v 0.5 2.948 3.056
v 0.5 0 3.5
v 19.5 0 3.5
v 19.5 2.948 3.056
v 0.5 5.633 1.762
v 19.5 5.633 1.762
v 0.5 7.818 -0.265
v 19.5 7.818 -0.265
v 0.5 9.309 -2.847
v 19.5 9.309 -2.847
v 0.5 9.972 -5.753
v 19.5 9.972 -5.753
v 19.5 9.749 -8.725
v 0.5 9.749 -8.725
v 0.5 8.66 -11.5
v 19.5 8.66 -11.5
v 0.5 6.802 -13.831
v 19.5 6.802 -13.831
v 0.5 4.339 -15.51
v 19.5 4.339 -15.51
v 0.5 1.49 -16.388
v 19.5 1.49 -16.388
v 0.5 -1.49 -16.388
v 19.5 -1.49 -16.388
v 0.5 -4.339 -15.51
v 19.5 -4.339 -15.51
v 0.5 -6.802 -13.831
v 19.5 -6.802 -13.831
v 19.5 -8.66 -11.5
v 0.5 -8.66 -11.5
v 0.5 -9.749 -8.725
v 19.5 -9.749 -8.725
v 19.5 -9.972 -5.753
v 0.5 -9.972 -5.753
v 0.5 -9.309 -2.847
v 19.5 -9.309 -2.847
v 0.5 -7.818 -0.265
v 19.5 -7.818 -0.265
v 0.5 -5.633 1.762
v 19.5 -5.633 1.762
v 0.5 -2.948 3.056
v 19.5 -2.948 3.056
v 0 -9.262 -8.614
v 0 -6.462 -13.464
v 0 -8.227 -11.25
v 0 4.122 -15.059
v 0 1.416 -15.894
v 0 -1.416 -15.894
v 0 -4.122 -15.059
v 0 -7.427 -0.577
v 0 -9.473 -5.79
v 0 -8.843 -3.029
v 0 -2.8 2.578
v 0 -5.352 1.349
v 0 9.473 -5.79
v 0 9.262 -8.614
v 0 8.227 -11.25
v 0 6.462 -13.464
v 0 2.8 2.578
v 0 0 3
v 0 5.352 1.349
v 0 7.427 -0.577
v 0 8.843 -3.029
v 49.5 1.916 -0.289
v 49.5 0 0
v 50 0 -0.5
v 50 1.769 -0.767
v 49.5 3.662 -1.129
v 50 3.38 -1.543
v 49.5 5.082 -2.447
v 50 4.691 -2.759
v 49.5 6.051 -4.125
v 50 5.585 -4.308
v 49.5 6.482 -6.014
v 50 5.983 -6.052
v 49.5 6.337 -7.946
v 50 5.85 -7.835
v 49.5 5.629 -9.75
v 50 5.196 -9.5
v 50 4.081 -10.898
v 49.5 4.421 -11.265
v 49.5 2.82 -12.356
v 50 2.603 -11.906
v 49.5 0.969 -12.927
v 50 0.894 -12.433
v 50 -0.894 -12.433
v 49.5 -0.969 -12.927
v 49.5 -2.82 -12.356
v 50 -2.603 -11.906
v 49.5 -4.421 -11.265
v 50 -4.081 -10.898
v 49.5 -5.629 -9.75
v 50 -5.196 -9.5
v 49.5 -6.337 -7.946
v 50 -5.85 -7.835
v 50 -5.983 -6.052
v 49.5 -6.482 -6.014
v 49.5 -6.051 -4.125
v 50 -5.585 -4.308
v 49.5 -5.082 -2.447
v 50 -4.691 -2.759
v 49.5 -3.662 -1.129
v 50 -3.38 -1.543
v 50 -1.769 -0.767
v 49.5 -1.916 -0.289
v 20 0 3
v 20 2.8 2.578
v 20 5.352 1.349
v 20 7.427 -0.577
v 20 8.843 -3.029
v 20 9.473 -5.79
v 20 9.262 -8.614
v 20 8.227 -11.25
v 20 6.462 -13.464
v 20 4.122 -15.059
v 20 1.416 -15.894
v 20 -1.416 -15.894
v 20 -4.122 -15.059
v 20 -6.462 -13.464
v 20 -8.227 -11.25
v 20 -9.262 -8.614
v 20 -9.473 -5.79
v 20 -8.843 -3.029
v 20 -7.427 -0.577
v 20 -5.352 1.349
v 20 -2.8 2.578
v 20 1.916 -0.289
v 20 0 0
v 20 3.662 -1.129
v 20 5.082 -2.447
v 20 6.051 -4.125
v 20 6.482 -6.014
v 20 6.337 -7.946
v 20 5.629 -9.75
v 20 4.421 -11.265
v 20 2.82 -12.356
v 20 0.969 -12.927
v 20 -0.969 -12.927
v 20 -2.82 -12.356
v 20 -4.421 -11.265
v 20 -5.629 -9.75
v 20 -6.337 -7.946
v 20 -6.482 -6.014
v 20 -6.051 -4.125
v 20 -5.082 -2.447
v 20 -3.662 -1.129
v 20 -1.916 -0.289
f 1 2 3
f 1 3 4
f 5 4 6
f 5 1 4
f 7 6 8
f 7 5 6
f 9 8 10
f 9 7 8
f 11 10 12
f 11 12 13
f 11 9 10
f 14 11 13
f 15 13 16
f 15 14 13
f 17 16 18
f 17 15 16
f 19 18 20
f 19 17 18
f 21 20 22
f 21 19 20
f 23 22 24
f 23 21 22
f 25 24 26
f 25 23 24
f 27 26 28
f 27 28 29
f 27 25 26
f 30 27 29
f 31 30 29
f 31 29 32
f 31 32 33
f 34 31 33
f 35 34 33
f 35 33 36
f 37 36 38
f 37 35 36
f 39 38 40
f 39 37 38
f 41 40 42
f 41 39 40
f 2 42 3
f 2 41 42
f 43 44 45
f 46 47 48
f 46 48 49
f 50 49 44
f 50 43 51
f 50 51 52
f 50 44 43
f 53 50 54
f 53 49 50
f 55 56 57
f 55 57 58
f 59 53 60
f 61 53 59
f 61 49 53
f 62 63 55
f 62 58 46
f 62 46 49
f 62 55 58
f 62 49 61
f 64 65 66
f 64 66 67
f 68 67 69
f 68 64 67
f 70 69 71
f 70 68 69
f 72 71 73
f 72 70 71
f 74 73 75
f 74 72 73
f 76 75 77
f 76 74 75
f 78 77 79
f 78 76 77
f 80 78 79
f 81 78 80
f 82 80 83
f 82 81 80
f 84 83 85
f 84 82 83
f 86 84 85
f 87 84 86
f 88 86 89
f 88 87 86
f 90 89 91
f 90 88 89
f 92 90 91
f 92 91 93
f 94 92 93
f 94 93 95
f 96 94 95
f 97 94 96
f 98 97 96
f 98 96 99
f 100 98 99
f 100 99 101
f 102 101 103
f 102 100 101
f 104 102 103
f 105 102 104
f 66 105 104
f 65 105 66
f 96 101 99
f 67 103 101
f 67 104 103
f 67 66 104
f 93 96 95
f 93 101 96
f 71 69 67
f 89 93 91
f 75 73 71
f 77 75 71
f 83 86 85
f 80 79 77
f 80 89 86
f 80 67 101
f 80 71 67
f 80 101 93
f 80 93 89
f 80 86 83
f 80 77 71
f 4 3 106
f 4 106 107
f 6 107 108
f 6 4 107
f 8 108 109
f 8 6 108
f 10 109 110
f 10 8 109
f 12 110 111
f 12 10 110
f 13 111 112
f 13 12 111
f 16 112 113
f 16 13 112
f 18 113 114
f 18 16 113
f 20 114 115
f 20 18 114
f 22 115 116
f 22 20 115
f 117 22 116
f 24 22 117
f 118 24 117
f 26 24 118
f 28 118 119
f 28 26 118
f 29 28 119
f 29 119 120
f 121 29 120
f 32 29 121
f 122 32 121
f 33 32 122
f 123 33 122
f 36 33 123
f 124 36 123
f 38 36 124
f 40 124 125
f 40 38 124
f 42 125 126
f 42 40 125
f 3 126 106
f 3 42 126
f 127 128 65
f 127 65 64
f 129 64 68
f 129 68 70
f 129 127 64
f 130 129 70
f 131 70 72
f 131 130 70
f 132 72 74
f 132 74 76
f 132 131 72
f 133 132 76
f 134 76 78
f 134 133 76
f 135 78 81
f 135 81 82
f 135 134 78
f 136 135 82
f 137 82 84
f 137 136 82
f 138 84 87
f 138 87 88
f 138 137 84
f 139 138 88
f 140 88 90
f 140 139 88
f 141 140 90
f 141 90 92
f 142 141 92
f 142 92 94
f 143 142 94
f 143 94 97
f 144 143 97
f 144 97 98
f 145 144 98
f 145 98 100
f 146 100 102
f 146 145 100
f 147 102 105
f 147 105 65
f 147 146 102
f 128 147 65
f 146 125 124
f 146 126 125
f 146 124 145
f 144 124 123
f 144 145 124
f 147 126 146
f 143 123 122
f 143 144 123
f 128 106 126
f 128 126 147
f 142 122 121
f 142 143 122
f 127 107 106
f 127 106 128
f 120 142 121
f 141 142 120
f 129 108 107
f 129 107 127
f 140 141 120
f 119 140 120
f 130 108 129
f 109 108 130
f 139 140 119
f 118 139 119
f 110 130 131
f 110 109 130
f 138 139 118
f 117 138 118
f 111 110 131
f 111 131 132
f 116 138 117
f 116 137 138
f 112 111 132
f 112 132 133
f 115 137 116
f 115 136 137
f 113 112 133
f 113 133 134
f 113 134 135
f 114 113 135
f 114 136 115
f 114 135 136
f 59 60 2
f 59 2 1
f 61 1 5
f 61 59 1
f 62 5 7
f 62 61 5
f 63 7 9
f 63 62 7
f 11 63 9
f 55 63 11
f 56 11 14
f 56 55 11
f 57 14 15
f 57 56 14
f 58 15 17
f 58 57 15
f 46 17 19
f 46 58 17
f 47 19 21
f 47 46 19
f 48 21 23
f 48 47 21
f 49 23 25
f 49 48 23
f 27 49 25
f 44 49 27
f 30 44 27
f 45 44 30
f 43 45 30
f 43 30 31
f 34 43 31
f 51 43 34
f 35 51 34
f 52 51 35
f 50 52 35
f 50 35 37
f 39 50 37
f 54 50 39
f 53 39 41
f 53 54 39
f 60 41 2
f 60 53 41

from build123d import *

# Parameters (mm, degrees)
F2_SIZE = 0.5
F3_SIZE = 0.5


with BuildPart() as f1:
    # F0 (on Front) → F1 (revolve)
    with BuildSketch(Plane.XZ):
        Polygon((0, 3.5), (0, 0), (0, -6.5), (50, -6.5), (50, 0), (20, 0), (20, 3.5), align=None)
    revolve(axis=Axis((25, 0, -6.5), (-1, 0, 0)))

    # F2
    f2_edges = [f1.edges().sort_by_distance(p)[0] for p in [
        (50, 0, -13),
    ]]
    chamfer(f2_edges, length=F2_SIZE)

    # F3
    f3_edges = [f1.edges().sort_by_distance(p)[0] for p in [
        (20, 0, -16.5),
        (0, 0, -16.5),
    ]]
    chamfer(f3_edges, length=F3_SIZE)


solid = f1.part
